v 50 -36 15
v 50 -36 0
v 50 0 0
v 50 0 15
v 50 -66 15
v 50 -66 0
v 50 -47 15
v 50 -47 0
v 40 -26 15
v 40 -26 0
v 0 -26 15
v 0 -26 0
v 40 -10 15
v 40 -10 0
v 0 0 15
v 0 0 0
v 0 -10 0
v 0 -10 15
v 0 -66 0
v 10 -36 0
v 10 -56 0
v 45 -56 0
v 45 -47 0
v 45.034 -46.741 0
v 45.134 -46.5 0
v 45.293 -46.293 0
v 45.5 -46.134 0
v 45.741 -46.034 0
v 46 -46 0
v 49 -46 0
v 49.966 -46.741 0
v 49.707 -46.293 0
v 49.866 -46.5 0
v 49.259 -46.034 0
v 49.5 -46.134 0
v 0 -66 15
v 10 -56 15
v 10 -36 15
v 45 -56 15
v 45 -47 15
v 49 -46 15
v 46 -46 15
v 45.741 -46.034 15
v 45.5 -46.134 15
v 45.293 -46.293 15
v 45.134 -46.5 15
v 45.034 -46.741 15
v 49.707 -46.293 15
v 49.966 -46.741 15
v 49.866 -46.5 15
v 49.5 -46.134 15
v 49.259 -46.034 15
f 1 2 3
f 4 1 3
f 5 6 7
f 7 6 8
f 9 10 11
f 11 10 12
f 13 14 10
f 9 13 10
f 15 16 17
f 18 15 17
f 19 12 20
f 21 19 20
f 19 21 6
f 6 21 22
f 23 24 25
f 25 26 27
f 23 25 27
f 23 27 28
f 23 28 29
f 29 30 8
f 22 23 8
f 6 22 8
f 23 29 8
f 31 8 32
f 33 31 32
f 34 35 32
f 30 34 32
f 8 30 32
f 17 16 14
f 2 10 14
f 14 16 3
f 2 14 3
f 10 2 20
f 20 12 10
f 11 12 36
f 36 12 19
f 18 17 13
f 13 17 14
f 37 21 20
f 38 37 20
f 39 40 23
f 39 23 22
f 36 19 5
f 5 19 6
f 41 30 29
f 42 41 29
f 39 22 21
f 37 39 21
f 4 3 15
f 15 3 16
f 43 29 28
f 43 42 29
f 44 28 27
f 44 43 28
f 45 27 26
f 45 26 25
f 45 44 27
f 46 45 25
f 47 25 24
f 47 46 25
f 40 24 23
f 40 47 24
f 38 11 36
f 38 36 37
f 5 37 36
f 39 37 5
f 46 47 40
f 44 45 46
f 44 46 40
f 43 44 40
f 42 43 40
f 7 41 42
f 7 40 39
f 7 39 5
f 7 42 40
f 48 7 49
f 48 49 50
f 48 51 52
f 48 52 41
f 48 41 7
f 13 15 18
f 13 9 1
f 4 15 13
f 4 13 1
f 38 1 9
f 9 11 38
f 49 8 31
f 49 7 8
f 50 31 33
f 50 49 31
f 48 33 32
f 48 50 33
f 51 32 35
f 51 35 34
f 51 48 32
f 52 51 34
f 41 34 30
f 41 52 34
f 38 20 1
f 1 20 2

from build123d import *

# Parameters (mm, degrees)
PAD_DEPTH = 15
FILLET_R  = 1


with BuildPart() as part:
    # Sketch → Pad (new body)
    with BuildSketch(Plane.XY):
        Polygon((0, -10), (40, -10), (40, -26), (0, -26), (0, -66), (50, -66), (50, -46), (45, -46), (45, -56), (10, -56), (10, -36), (50, -36), (50, 0), (0, 0), align=None)
    extrude(amount=PAD_DEPTH)

    # Fillet
    fillet_edges = [part.edges().sort_by_distance(p)[0] for p in [
        (50, -46, 7.5),
        (45, -46, 7.5),
    ]]
    fillet(fillet_edges, radius=FILLET_R)


solid = part.part
